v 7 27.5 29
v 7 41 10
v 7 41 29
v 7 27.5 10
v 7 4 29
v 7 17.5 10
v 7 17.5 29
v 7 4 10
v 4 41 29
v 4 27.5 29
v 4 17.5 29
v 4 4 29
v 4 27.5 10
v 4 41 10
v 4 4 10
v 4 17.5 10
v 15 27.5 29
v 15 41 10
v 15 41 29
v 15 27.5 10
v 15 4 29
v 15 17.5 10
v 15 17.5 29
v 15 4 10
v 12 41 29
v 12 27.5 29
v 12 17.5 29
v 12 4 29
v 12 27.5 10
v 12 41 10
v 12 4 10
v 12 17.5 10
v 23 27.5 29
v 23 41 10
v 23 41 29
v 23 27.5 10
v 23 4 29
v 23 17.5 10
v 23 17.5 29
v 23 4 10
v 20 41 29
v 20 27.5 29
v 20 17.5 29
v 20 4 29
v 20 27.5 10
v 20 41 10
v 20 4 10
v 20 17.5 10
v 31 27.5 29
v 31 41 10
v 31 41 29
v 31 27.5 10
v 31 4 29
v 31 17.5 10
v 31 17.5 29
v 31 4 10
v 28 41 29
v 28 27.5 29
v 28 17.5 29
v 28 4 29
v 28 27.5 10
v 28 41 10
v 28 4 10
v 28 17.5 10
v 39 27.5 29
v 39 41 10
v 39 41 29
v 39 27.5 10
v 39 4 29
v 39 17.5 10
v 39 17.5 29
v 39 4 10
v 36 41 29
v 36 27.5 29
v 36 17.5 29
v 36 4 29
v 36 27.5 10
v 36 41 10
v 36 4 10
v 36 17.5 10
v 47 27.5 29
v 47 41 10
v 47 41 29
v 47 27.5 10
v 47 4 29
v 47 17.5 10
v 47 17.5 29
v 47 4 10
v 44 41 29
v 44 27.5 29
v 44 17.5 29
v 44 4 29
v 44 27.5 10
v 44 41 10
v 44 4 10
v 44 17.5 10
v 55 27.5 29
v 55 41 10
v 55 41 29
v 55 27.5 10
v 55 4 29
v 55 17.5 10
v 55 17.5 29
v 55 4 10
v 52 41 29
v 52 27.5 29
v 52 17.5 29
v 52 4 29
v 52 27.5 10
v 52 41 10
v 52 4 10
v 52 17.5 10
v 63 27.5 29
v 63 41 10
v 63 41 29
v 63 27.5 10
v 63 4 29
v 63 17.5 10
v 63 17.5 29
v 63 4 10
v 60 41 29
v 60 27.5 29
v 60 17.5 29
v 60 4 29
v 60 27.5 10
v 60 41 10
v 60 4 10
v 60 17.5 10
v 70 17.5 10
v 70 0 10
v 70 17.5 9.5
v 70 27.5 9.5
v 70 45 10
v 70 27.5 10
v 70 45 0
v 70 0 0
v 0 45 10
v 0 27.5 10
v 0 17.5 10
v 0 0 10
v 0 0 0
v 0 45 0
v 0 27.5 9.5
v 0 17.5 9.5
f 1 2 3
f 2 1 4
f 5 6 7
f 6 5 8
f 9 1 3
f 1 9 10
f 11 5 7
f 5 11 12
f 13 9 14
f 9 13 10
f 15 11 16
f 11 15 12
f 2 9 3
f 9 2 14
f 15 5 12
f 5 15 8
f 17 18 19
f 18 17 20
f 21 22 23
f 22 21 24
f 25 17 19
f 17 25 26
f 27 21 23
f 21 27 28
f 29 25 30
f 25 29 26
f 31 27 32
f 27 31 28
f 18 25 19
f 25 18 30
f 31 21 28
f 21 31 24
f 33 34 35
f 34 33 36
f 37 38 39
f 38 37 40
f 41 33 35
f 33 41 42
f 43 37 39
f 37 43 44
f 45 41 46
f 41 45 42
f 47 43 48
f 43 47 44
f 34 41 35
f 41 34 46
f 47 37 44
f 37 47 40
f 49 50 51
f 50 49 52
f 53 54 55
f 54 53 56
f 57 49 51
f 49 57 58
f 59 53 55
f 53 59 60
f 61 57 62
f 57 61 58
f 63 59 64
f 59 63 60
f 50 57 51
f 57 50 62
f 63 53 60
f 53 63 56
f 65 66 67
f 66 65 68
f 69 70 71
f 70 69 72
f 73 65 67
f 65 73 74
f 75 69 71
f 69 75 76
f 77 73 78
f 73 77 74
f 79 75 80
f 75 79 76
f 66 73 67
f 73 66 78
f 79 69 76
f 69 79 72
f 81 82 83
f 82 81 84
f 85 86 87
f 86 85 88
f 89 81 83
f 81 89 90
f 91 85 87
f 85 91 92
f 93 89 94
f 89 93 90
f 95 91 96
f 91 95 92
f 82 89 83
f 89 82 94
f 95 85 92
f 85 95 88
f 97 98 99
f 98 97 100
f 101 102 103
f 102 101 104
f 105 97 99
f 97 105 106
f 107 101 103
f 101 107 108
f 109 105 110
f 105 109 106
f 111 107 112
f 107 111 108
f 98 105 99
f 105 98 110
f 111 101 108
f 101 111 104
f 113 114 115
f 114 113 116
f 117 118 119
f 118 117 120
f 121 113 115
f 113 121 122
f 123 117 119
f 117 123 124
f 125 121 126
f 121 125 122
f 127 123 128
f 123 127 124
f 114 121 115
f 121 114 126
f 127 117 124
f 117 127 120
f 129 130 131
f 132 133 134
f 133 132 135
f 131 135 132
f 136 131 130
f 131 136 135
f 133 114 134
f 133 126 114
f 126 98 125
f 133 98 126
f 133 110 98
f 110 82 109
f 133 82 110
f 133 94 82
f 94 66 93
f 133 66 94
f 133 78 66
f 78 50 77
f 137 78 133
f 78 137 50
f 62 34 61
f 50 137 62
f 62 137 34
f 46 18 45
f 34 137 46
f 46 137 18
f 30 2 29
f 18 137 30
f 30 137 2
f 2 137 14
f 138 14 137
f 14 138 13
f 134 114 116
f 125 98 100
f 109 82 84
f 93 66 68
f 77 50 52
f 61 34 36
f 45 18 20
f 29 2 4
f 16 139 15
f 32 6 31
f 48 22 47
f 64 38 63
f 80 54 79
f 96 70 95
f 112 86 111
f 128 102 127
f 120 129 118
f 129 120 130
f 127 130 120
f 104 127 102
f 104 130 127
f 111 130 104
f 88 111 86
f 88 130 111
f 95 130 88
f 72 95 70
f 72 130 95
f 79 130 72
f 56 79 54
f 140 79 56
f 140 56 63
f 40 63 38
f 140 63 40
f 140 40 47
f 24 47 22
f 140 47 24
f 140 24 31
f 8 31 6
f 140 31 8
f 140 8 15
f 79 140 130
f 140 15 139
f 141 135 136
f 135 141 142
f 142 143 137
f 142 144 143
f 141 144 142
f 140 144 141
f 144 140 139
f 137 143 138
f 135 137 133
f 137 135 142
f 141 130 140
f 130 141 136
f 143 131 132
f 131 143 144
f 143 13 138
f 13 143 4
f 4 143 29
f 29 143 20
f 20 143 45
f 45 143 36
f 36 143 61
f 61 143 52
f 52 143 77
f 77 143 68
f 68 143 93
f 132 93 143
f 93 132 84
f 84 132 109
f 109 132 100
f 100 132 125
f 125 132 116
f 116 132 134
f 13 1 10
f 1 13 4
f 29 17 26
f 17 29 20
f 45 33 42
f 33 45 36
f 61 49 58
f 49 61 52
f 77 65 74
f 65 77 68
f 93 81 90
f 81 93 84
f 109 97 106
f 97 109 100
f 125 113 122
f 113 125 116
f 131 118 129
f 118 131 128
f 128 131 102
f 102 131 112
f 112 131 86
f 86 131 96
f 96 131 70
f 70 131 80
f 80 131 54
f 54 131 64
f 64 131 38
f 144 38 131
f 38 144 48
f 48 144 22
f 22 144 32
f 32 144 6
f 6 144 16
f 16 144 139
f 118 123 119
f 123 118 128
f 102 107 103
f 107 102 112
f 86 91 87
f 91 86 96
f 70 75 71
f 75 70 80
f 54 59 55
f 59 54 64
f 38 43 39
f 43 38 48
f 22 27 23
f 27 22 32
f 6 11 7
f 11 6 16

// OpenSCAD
$fn = 32;

// ----------------------------------------------------------------------
// Heatsink: slotted fin block
// ----------------------------------------------------------------------

// --- parameters (mm) ---
base_l = 70;              // base length, X
base_w = 45;              // base width, Y
base_t = 10;              // base plate thickness
fin_h = 20;               // fin height above the base
fin_t = 3;                // fin thickness
edge = 4;                 // margin from the base ends
pitch = 8;                // fin pitch
slot_w = 10;              // central slot width, Y

n_fins = floor((base_l - 2 * edge - fin_t) / pitch) + 1;  // fin count
total_h = base_t + fin_h - 1;  // overall height

difference() {
union() {
  cube([base_l, base_w, base_t]);
  for (i = [0 : n_fins - 1])
    translate([edge + i * pitch, edge, base_t - 1])
      cube([fin_t, base_w - 2 * edge, fin_h]);
}
  translate([-1, base_w / 2 - slot_w / 2, base_t - 0.5])
    cube([base_l + 2, slot_w, fin_h + 2]);
}
